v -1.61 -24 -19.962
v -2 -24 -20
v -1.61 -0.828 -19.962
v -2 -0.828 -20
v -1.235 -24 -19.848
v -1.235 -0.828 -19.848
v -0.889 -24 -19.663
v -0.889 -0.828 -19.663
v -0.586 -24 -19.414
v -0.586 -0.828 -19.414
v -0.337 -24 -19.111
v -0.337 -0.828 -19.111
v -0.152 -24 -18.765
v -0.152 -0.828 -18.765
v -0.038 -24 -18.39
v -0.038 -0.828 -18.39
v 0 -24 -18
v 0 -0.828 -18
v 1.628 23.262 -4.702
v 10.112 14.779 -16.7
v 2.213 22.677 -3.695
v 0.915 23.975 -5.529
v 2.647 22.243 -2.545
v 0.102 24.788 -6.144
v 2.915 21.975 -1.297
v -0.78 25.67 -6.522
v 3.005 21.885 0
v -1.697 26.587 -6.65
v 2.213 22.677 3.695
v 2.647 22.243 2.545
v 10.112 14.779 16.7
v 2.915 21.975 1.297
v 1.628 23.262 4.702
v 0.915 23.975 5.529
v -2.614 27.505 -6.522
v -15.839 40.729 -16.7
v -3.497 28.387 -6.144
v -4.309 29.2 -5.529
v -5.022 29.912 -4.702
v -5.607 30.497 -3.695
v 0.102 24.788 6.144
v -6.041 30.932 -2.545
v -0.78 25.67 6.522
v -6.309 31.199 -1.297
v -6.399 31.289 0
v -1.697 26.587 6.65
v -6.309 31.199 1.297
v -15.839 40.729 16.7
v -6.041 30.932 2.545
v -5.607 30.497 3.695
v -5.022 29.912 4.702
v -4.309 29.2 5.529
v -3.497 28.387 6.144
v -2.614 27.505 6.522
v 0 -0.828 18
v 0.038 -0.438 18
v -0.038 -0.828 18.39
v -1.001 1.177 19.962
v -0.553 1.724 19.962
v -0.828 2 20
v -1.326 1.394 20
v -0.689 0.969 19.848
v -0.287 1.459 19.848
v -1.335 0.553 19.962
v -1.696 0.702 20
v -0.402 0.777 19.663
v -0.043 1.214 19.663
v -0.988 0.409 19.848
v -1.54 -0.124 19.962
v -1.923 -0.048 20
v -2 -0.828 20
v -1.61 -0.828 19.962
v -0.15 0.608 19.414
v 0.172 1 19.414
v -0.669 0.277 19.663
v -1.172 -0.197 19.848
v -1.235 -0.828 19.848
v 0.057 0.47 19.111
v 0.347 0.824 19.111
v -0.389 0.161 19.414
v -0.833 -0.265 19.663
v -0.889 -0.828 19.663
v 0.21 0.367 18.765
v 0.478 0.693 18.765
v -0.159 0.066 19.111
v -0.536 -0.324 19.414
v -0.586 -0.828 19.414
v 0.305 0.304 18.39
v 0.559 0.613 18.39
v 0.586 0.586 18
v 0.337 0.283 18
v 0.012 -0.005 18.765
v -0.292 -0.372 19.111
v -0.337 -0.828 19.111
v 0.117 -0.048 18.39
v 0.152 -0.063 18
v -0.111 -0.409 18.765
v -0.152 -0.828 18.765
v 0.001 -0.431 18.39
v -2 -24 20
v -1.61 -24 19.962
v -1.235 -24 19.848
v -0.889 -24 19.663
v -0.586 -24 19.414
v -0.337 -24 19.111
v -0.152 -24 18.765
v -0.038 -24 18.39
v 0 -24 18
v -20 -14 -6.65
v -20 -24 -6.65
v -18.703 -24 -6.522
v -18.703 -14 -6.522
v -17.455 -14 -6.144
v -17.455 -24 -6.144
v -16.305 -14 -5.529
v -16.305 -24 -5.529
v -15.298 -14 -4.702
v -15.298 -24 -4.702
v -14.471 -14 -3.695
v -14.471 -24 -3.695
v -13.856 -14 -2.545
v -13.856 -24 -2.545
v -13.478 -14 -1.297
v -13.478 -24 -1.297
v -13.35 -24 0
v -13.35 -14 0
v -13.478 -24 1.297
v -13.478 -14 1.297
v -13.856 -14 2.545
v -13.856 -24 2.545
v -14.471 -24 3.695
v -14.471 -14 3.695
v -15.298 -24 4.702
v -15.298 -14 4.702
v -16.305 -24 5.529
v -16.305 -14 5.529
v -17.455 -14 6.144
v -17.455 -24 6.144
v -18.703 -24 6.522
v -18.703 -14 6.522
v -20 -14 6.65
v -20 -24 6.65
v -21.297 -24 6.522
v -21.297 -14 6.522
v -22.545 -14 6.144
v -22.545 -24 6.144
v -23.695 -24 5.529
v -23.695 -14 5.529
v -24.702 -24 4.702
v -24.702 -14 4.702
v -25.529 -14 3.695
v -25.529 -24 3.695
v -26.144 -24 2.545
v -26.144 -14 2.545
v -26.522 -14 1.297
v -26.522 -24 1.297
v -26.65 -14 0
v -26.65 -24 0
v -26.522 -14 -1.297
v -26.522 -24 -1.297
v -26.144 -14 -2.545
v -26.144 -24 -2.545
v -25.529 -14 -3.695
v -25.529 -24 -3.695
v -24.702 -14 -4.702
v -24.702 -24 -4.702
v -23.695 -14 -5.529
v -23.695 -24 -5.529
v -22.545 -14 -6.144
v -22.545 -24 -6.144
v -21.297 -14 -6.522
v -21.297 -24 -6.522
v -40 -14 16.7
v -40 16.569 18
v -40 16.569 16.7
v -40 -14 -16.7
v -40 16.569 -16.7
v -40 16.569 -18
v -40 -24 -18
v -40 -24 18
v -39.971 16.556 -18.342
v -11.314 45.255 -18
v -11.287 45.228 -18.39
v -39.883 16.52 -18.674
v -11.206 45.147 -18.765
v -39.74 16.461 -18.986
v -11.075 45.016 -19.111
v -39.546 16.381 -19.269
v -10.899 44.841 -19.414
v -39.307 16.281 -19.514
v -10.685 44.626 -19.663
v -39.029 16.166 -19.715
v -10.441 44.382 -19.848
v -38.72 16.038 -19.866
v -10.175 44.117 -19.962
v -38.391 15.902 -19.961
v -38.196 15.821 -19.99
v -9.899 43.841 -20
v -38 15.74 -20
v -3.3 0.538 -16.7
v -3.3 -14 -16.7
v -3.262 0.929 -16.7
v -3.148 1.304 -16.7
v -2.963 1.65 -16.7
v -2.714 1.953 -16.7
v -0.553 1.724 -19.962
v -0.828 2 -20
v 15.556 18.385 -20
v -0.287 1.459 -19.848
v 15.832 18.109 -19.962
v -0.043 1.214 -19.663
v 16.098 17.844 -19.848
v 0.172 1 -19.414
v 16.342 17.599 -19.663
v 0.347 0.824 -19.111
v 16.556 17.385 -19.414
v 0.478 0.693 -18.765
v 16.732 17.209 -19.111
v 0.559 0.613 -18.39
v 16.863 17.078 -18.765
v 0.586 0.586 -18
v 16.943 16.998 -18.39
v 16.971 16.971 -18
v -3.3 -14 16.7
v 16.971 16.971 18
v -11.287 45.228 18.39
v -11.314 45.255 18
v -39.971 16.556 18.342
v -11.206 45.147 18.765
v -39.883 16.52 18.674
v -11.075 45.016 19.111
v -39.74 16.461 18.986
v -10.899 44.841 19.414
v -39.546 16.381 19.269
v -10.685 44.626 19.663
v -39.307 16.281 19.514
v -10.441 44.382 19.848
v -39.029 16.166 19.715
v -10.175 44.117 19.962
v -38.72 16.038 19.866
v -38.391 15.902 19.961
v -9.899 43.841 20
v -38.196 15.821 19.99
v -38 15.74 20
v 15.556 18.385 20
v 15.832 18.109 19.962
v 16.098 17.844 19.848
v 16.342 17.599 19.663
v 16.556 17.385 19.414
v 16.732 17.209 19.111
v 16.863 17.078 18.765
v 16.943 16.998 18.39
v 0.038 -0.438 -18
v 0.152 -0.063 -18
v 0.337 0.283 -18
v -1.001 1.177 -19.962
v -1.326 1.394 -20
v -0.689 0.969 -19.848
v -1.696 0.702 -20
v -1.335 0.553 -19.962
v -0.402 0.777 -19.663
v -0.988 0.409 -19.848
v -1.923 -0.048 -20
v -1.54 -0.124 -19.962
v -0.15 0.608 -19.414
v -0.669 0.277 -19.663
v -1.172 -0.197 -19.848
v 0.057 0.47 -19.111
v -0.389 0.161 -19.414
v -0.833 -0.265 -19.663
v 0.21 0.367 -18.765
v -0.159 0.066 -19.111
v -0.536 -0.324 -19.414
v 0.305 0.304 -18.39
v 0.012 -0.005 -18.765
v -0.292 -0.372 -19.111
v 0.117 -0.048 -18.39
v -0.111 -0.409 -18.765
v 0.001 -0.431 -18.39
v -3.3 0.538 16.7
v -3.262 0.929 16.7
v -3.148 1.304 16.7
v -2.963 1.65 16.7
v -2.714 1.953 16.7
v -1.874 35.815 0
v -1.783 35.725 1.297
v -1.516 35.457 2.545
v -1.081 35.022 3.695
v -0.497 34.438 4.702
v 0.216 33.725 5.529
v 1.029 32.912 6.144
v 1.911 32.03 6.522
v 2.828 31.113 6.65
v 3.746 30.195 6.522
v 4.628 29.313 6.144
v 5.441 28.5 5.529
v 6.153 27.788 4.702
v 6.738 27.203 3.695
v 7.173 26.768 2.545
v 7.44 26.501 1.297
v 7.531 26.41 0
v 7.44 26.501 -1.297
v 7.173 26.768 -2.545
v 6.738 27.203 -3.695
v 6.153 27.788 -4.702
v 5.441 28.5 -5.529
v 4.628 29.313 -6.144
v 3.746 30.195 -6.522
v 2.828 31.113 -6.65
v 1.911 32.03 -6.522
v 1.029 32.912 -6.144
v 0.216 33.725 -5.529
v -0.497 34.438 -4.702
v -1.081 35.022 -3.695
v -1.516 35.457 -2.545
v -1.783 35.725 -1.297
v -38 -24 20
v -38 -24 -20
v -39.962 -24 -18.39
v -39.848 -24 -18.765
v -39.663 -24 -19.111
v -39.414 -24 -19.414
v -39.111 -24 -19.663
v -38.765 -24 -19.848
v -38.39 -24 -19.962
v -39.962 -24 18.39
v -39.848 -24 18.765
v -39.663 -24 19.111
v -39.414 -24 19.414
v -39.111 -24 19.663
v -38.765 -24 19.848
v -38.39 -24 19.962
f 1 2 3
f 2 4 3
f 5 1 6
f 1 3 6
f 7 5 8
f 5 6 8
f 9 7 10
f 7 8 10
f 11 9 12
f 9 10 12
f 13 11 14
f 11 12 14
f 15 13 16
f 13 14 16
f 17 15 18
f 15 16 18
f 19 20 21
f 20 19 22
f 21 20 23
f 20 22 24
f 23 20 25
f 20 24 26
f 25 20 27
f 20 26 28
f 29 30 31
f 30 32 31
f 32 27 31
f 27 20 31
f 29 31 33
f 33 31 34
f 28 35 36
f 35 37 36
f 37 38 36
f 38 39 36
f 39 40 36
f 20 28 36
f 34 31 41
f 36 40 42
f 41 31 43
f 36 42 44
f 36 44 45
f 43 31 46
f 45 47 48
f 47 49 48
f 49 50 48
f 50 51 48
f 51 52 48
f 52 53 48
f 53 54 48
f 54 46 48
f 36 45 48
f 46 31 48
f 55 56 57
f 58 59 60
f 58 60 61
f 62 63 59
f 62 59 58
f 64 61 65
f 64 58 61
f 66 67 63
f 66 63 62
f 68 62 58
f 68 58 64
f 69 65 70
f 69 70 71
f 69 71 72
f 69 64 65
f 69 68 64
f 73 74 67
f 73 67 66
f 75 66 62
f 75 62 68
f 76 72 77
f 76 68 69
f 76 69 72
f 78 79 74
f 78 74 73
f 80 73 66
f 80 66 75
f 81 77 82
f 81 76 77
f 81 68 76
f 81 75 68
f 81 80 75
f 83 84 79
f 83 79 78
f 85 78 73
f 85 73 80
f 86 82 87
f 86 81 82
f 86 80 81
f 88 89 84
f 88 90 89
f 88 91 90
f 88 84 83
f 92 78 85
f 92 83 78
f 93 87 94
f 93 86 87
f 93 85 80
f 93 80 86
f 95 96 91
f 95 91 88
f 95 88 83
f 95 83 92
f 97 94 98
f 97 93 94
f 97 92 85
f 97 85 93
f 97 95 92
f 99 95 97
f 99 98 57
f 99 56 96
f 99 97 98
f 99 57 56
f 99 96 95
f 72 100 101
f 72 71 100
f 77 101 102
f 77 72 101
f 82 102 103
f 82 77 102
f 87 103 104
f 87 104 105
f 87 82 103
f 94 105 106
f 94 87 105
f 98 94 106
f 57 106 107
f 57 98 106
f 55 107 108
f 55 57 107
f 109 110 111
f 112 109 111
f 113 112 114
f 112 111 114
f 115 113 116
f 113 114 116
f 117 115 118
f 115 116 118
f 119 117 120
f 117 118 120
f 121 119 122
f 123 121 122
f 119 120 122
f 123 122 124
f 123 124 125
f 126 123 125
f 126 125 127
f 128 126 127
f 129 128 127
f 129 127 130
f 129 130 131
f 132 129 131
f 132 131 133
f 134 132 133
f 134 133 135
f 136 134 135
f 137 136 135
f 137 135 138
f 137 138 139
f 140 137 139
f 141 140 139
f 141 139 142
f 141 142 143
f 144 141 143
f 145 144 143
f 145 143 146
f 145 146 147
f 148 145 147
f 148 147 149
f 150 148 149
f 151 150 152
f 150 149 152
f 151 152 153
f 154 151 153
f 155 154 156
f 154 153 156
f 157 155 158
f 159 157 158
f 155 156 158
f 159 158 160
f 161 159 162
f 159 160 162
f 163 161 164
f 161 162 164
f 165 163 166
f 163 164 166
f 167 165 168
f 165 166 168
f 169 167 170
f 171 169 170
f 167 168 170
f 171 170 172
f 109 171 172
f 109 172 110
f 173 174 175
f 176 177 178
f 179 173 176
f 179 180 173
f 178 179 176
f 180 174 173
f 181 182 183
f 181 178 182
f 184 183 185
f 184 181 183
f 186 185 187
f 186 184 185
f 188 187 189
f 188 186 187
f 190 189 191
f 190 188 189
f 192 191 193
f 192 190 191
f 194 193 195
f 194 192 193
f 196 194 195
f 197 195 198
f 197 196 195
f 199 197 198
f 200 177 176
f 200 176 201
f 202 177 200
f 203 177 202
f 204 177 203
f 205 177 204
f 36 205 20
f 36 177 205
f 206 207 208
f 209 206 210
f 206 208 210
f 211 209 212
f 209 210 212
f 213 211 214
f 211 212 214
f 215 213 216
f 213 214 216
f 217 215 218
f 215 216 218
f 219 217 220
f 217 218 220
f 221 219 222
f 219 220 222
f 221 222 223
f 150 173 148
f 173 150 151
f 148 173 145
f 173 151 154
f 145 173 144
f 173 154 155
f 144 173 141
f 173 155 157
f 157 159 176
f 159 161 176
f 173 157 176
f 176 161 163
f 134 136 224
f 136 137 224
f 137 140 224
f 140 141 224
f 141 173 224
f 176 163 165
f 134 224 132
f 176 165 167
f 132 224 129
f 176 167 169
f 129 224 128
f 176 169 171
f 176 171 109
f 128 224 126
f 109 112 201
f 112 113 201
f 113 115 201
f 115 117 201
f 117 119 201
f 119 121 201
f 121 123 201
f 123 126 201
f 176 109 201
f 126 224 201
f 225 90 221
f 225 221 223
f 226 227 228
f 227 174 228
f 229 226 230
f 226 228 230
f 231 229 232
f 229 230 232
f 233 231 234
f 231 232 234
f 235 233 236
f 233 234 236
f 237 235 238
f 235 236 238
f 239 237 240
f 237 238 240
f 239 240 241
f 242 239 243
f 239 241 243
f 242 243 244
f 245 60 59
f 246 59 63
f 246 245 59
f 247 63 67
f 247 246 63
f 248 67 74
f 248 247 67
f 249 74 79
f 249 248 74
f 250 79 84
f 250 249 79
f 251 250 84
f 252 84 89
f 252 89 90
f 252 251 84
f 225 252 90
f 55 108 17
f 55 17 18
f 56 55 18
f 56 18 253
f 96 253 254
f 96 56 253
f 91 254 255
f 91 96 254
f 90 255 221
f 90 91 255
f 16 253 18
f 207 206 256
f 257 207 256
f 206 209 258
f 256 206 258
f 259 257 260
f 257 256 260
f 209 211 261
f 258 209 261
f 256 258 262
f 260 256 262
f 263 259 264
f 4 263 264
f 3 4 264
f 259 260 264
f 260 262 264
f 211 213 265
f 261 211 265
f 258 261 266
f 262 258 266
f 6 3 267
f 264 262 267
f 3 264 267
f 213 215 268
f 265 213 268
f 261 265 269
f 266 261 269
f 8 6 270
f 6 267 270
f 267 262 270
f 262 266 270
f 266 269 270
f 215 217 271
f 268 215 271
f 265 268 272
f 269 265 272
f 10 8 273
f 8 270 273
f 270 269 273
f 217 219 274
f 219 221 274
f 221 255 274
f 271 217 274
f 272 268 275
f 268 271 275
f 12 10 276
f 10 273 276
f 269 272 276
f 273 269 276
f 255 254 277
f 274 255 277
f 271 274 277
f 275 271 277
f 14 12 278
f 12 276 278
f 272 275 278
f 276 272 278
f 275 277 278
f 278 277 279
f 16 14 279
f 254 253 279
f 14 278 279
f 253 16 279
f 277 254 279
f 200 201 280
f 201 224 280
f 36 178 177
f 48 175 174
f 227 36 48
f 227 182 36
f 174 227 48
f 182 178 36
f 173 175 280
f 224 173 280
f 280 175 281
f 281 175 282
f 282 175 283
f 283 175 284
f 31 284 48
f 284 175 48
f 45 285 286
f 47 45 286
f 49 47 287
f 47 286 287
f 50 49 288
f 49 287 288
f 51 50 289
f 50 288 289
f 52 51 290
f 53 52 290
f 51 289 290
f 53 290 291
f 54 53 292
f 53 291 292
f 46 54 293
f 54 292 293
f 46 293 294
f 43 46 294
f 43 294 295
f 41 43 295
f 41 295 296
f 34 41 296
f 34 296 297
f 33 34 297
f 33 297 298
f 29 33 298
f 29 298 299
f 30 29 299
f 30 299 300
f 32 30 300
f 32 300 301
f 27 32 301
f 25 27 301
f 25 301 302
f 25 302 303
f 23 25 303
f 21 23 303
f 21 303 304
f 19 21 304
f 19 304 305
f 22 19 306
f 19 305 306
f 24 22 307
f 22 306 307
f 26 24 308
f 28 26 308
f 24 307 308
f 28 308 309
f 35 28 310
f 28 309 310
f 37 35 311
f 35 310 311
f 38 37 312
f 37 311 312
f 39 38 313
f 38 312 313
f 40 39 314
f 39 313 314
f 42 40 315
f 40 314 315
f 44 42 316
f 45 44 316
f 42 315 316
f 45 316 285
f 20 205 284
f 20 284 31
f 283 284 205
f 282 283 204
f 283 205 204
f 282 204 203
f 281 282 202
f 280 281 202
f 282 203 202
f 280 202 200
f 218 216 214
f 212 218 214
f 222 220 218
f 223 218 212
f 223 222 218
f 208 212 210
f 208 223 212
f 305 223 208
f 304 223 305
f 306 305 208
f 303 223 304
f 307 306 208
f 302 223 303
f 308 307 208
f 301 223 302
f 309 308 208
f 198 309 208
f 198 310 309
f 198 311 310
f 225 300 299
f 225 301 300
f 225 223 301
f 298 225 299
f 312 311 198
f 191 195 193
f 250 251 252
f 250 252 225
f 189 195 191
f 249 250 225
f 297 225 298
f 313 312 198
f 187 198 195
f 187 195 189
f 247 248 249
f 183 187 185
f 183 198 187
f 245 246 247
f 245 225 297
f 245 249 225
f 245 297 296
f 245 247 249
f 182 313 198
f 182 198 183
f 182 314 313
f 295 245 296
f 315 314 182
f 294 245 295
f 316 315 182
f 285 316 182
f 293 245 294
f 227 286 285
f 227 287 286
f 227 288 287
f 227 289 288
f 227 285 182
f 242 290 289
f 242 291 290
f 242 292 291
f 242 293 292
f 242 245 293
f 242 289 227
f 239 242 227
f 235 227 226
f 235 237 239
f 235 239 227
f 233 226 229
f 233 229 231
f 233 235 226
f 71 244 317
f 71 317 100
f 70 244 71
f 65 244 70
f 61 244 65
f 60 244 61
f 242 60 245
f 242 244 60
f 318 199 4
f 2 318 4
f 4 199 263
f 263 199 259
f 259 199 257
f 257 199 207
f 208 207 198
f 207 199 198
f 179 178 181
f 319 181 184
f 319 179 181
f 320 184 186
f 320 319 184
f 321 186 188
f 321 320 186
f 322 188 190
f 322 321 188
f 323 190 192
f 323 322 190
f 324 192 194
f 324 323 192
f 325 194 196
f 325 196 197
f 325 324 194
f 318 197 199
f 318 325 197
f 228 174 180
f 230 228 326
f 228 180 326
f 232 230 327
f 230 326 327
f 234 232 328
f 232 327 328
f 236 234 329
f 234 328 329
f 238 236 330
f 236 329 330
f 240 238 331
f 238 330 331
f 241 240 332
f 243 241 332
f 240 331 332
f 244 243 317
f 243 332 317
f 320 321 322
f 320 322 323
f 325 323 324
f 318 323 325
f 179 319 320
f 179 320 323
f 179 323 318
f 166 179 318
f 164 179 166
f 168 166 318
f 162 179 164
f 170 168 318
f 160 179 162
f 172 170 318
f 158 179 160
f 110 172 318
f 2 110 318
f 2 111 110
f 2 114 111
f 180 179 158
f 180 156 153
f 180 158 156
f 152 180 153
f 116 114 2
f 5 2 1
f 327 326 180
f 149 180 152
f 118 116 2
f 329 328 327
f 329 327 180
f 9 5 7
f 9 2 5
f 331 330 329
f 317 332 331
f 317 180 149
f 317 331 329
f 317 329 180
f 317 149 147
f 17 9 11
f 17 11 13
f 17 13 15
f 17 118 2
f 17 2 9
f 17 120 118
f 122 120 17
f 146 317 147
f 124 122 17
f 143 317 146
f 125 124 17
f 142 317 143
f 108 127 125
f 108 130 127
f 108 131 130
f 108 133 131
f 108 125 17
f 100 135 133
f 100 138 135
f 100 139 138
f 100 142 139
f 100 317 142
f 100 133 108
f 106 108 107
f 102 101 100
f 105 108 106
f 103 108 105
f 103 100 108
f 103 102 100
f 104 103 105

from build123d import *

# Parameters (mm, degrees)
BOSS_EXTRUDE1_DEPTH       = 20
SHELL1_T                  = -3.3
SHELL1_THICKNESS_2_FACE_W = 33.4
SHELL1_THICKNESS_2_FACE_H = 36.7
SHELL1_THICKNESS_2_DEPTH  = 6.7
SHELL1_THICKNESS_3_FACE_W = 36.7
SHELL1_THICKNESS_3_FACE_H = 33.4
SHELL1_THICKNESS_3_DEPTH  = 3.1
CUT_EXTRUDE1_REACH        = 84.439
SKETCH2_R                 = 6.65
CUT_EXTRUDE2_REACH        = 74.967
SKETCH3_R                 = 6.65
FILLET1_R                 = 2


with BuildPart() as part:
    # Sketch1 → Boss-Extrude1 (new, symmetric)
    with BuildSketch(Plane.XY):
        Polygon((0, -24), (0, 0), (16.970562748, 16.970562748), (-11.313708499, 45.254833996), (-40, 16.568542495), (-40, -24), align=None)
    extrude(amount=BOSS_EXTRUDE1_DEPTH, both=True)

    # Shell1
    shell1_openings = [part.faces().sort_by_distance(p)[0] for p in [
        (-40, -3.715728753, 0),
        (-25.656854249, 30.911688245, 0),
    ]]
    offset(amount=SHELL1_T, openings=shell1_openings, kind=Kind.INTERSECTION)

    # Shell1 thickness 2 face (on inner face of the shell) → Shell1 thickness 2 (add)
    with BuildSketch(Plane(origin=(-21.65, -20.7, 0), x_dir=(0, 0, -1), z_dir=(0, -1, 0))):
        Rectangle(SHELL1_THICKNESS_2_FACE_W, SHELL1_THICKNESS_2_FACE_H)
    extrude(amount=-SHELL1_THICKNESS_2_DEPTH)

    # Shell1 thickness 3 face (on inner face of the shell) → Shell1 thickness 3 (add)
    with BuildSketch(Plane(origin=(-0.671751442, 29.945972183, 0), x_dir=(-0.707106781187, 0.707106781187, 0), z_dir=(0.707106781187, 0.707106781187, 0))):
        Rectangle(SHELL1_THICKNESS_3_FACE_W, SHELL1_THICKNESS_3_FACE_H)
    extrude(amount=-SHELL1_THICKNESS_3_DEPTH)

    # Sketch2 → Cut-Extrude1 (cut, up to next)
    with BuildSketch(Plane.XZ.offset(24), mode=Mode.PRIVATE) as cut_extrude1_sk1:
        with Locations(Location((-20, 0, 0), (0, 0, 270))):
            Circle(SKETCH2_R)
    cut_extrude1_tool1 = extrude(cut_extrude1_sk1.sketch, amount=-CUT_EXTRUDE1_REACH, mode=Mode.PRIVATE) & part.part
    add(cut_extrude1_tool1.solids().sort_by_distance((-20, -24, 0))[0], mode=Mode.SUBTRACT)

    # Sketch3 → Cut-Extrude2 (cut, up to next)
    with BuildSketch(Plane(origin=(16.970562748, 16.970562748, 0), x_dir=(0, 0, -1), z_dir=(0.7071067811865488, 0.7071067811865462, 0)), mode=Mode.PRIVATE) as cut_extrude2_sk1:
        with Locations(Location((0, 20, 0), (0, 0, 90))):
            Circle(SKETCH3_R)
    cut_extrude2_tool1 = extrude(cut_extrude2_sk1.sketch, amount=-CUT_EXTRUDE2_REACH, mode=Mode.PRIVATE) & part.part
    add(cut_extrude2_tool1.solids().sort_by_distance((2.828427, 31.112698, 0))[0], mode=Mode.SUBTRACT)

    # Fillet1
    fillet1_edges = [part.edges().sort_by_distance(p)[0] for p in [
        (0, 0, 0),
        (8.485281374, 8.485281374, 20),
        (-25.656854249, 30.911688245, 20),
        (-3.3, 1.366904756, 0),
        (-40, -3.715728753, 20),
        (-40, -3.715728753, -20),
        (-25.656854249, 30.911688245, -20),
        (8.485281374, 8.485281374, -20),
        (0, -12, -20),
        (0, -12, 20),
    ]]
    fillet(fillet1_edges, radius=FILLET1_R)


solid = part.part
